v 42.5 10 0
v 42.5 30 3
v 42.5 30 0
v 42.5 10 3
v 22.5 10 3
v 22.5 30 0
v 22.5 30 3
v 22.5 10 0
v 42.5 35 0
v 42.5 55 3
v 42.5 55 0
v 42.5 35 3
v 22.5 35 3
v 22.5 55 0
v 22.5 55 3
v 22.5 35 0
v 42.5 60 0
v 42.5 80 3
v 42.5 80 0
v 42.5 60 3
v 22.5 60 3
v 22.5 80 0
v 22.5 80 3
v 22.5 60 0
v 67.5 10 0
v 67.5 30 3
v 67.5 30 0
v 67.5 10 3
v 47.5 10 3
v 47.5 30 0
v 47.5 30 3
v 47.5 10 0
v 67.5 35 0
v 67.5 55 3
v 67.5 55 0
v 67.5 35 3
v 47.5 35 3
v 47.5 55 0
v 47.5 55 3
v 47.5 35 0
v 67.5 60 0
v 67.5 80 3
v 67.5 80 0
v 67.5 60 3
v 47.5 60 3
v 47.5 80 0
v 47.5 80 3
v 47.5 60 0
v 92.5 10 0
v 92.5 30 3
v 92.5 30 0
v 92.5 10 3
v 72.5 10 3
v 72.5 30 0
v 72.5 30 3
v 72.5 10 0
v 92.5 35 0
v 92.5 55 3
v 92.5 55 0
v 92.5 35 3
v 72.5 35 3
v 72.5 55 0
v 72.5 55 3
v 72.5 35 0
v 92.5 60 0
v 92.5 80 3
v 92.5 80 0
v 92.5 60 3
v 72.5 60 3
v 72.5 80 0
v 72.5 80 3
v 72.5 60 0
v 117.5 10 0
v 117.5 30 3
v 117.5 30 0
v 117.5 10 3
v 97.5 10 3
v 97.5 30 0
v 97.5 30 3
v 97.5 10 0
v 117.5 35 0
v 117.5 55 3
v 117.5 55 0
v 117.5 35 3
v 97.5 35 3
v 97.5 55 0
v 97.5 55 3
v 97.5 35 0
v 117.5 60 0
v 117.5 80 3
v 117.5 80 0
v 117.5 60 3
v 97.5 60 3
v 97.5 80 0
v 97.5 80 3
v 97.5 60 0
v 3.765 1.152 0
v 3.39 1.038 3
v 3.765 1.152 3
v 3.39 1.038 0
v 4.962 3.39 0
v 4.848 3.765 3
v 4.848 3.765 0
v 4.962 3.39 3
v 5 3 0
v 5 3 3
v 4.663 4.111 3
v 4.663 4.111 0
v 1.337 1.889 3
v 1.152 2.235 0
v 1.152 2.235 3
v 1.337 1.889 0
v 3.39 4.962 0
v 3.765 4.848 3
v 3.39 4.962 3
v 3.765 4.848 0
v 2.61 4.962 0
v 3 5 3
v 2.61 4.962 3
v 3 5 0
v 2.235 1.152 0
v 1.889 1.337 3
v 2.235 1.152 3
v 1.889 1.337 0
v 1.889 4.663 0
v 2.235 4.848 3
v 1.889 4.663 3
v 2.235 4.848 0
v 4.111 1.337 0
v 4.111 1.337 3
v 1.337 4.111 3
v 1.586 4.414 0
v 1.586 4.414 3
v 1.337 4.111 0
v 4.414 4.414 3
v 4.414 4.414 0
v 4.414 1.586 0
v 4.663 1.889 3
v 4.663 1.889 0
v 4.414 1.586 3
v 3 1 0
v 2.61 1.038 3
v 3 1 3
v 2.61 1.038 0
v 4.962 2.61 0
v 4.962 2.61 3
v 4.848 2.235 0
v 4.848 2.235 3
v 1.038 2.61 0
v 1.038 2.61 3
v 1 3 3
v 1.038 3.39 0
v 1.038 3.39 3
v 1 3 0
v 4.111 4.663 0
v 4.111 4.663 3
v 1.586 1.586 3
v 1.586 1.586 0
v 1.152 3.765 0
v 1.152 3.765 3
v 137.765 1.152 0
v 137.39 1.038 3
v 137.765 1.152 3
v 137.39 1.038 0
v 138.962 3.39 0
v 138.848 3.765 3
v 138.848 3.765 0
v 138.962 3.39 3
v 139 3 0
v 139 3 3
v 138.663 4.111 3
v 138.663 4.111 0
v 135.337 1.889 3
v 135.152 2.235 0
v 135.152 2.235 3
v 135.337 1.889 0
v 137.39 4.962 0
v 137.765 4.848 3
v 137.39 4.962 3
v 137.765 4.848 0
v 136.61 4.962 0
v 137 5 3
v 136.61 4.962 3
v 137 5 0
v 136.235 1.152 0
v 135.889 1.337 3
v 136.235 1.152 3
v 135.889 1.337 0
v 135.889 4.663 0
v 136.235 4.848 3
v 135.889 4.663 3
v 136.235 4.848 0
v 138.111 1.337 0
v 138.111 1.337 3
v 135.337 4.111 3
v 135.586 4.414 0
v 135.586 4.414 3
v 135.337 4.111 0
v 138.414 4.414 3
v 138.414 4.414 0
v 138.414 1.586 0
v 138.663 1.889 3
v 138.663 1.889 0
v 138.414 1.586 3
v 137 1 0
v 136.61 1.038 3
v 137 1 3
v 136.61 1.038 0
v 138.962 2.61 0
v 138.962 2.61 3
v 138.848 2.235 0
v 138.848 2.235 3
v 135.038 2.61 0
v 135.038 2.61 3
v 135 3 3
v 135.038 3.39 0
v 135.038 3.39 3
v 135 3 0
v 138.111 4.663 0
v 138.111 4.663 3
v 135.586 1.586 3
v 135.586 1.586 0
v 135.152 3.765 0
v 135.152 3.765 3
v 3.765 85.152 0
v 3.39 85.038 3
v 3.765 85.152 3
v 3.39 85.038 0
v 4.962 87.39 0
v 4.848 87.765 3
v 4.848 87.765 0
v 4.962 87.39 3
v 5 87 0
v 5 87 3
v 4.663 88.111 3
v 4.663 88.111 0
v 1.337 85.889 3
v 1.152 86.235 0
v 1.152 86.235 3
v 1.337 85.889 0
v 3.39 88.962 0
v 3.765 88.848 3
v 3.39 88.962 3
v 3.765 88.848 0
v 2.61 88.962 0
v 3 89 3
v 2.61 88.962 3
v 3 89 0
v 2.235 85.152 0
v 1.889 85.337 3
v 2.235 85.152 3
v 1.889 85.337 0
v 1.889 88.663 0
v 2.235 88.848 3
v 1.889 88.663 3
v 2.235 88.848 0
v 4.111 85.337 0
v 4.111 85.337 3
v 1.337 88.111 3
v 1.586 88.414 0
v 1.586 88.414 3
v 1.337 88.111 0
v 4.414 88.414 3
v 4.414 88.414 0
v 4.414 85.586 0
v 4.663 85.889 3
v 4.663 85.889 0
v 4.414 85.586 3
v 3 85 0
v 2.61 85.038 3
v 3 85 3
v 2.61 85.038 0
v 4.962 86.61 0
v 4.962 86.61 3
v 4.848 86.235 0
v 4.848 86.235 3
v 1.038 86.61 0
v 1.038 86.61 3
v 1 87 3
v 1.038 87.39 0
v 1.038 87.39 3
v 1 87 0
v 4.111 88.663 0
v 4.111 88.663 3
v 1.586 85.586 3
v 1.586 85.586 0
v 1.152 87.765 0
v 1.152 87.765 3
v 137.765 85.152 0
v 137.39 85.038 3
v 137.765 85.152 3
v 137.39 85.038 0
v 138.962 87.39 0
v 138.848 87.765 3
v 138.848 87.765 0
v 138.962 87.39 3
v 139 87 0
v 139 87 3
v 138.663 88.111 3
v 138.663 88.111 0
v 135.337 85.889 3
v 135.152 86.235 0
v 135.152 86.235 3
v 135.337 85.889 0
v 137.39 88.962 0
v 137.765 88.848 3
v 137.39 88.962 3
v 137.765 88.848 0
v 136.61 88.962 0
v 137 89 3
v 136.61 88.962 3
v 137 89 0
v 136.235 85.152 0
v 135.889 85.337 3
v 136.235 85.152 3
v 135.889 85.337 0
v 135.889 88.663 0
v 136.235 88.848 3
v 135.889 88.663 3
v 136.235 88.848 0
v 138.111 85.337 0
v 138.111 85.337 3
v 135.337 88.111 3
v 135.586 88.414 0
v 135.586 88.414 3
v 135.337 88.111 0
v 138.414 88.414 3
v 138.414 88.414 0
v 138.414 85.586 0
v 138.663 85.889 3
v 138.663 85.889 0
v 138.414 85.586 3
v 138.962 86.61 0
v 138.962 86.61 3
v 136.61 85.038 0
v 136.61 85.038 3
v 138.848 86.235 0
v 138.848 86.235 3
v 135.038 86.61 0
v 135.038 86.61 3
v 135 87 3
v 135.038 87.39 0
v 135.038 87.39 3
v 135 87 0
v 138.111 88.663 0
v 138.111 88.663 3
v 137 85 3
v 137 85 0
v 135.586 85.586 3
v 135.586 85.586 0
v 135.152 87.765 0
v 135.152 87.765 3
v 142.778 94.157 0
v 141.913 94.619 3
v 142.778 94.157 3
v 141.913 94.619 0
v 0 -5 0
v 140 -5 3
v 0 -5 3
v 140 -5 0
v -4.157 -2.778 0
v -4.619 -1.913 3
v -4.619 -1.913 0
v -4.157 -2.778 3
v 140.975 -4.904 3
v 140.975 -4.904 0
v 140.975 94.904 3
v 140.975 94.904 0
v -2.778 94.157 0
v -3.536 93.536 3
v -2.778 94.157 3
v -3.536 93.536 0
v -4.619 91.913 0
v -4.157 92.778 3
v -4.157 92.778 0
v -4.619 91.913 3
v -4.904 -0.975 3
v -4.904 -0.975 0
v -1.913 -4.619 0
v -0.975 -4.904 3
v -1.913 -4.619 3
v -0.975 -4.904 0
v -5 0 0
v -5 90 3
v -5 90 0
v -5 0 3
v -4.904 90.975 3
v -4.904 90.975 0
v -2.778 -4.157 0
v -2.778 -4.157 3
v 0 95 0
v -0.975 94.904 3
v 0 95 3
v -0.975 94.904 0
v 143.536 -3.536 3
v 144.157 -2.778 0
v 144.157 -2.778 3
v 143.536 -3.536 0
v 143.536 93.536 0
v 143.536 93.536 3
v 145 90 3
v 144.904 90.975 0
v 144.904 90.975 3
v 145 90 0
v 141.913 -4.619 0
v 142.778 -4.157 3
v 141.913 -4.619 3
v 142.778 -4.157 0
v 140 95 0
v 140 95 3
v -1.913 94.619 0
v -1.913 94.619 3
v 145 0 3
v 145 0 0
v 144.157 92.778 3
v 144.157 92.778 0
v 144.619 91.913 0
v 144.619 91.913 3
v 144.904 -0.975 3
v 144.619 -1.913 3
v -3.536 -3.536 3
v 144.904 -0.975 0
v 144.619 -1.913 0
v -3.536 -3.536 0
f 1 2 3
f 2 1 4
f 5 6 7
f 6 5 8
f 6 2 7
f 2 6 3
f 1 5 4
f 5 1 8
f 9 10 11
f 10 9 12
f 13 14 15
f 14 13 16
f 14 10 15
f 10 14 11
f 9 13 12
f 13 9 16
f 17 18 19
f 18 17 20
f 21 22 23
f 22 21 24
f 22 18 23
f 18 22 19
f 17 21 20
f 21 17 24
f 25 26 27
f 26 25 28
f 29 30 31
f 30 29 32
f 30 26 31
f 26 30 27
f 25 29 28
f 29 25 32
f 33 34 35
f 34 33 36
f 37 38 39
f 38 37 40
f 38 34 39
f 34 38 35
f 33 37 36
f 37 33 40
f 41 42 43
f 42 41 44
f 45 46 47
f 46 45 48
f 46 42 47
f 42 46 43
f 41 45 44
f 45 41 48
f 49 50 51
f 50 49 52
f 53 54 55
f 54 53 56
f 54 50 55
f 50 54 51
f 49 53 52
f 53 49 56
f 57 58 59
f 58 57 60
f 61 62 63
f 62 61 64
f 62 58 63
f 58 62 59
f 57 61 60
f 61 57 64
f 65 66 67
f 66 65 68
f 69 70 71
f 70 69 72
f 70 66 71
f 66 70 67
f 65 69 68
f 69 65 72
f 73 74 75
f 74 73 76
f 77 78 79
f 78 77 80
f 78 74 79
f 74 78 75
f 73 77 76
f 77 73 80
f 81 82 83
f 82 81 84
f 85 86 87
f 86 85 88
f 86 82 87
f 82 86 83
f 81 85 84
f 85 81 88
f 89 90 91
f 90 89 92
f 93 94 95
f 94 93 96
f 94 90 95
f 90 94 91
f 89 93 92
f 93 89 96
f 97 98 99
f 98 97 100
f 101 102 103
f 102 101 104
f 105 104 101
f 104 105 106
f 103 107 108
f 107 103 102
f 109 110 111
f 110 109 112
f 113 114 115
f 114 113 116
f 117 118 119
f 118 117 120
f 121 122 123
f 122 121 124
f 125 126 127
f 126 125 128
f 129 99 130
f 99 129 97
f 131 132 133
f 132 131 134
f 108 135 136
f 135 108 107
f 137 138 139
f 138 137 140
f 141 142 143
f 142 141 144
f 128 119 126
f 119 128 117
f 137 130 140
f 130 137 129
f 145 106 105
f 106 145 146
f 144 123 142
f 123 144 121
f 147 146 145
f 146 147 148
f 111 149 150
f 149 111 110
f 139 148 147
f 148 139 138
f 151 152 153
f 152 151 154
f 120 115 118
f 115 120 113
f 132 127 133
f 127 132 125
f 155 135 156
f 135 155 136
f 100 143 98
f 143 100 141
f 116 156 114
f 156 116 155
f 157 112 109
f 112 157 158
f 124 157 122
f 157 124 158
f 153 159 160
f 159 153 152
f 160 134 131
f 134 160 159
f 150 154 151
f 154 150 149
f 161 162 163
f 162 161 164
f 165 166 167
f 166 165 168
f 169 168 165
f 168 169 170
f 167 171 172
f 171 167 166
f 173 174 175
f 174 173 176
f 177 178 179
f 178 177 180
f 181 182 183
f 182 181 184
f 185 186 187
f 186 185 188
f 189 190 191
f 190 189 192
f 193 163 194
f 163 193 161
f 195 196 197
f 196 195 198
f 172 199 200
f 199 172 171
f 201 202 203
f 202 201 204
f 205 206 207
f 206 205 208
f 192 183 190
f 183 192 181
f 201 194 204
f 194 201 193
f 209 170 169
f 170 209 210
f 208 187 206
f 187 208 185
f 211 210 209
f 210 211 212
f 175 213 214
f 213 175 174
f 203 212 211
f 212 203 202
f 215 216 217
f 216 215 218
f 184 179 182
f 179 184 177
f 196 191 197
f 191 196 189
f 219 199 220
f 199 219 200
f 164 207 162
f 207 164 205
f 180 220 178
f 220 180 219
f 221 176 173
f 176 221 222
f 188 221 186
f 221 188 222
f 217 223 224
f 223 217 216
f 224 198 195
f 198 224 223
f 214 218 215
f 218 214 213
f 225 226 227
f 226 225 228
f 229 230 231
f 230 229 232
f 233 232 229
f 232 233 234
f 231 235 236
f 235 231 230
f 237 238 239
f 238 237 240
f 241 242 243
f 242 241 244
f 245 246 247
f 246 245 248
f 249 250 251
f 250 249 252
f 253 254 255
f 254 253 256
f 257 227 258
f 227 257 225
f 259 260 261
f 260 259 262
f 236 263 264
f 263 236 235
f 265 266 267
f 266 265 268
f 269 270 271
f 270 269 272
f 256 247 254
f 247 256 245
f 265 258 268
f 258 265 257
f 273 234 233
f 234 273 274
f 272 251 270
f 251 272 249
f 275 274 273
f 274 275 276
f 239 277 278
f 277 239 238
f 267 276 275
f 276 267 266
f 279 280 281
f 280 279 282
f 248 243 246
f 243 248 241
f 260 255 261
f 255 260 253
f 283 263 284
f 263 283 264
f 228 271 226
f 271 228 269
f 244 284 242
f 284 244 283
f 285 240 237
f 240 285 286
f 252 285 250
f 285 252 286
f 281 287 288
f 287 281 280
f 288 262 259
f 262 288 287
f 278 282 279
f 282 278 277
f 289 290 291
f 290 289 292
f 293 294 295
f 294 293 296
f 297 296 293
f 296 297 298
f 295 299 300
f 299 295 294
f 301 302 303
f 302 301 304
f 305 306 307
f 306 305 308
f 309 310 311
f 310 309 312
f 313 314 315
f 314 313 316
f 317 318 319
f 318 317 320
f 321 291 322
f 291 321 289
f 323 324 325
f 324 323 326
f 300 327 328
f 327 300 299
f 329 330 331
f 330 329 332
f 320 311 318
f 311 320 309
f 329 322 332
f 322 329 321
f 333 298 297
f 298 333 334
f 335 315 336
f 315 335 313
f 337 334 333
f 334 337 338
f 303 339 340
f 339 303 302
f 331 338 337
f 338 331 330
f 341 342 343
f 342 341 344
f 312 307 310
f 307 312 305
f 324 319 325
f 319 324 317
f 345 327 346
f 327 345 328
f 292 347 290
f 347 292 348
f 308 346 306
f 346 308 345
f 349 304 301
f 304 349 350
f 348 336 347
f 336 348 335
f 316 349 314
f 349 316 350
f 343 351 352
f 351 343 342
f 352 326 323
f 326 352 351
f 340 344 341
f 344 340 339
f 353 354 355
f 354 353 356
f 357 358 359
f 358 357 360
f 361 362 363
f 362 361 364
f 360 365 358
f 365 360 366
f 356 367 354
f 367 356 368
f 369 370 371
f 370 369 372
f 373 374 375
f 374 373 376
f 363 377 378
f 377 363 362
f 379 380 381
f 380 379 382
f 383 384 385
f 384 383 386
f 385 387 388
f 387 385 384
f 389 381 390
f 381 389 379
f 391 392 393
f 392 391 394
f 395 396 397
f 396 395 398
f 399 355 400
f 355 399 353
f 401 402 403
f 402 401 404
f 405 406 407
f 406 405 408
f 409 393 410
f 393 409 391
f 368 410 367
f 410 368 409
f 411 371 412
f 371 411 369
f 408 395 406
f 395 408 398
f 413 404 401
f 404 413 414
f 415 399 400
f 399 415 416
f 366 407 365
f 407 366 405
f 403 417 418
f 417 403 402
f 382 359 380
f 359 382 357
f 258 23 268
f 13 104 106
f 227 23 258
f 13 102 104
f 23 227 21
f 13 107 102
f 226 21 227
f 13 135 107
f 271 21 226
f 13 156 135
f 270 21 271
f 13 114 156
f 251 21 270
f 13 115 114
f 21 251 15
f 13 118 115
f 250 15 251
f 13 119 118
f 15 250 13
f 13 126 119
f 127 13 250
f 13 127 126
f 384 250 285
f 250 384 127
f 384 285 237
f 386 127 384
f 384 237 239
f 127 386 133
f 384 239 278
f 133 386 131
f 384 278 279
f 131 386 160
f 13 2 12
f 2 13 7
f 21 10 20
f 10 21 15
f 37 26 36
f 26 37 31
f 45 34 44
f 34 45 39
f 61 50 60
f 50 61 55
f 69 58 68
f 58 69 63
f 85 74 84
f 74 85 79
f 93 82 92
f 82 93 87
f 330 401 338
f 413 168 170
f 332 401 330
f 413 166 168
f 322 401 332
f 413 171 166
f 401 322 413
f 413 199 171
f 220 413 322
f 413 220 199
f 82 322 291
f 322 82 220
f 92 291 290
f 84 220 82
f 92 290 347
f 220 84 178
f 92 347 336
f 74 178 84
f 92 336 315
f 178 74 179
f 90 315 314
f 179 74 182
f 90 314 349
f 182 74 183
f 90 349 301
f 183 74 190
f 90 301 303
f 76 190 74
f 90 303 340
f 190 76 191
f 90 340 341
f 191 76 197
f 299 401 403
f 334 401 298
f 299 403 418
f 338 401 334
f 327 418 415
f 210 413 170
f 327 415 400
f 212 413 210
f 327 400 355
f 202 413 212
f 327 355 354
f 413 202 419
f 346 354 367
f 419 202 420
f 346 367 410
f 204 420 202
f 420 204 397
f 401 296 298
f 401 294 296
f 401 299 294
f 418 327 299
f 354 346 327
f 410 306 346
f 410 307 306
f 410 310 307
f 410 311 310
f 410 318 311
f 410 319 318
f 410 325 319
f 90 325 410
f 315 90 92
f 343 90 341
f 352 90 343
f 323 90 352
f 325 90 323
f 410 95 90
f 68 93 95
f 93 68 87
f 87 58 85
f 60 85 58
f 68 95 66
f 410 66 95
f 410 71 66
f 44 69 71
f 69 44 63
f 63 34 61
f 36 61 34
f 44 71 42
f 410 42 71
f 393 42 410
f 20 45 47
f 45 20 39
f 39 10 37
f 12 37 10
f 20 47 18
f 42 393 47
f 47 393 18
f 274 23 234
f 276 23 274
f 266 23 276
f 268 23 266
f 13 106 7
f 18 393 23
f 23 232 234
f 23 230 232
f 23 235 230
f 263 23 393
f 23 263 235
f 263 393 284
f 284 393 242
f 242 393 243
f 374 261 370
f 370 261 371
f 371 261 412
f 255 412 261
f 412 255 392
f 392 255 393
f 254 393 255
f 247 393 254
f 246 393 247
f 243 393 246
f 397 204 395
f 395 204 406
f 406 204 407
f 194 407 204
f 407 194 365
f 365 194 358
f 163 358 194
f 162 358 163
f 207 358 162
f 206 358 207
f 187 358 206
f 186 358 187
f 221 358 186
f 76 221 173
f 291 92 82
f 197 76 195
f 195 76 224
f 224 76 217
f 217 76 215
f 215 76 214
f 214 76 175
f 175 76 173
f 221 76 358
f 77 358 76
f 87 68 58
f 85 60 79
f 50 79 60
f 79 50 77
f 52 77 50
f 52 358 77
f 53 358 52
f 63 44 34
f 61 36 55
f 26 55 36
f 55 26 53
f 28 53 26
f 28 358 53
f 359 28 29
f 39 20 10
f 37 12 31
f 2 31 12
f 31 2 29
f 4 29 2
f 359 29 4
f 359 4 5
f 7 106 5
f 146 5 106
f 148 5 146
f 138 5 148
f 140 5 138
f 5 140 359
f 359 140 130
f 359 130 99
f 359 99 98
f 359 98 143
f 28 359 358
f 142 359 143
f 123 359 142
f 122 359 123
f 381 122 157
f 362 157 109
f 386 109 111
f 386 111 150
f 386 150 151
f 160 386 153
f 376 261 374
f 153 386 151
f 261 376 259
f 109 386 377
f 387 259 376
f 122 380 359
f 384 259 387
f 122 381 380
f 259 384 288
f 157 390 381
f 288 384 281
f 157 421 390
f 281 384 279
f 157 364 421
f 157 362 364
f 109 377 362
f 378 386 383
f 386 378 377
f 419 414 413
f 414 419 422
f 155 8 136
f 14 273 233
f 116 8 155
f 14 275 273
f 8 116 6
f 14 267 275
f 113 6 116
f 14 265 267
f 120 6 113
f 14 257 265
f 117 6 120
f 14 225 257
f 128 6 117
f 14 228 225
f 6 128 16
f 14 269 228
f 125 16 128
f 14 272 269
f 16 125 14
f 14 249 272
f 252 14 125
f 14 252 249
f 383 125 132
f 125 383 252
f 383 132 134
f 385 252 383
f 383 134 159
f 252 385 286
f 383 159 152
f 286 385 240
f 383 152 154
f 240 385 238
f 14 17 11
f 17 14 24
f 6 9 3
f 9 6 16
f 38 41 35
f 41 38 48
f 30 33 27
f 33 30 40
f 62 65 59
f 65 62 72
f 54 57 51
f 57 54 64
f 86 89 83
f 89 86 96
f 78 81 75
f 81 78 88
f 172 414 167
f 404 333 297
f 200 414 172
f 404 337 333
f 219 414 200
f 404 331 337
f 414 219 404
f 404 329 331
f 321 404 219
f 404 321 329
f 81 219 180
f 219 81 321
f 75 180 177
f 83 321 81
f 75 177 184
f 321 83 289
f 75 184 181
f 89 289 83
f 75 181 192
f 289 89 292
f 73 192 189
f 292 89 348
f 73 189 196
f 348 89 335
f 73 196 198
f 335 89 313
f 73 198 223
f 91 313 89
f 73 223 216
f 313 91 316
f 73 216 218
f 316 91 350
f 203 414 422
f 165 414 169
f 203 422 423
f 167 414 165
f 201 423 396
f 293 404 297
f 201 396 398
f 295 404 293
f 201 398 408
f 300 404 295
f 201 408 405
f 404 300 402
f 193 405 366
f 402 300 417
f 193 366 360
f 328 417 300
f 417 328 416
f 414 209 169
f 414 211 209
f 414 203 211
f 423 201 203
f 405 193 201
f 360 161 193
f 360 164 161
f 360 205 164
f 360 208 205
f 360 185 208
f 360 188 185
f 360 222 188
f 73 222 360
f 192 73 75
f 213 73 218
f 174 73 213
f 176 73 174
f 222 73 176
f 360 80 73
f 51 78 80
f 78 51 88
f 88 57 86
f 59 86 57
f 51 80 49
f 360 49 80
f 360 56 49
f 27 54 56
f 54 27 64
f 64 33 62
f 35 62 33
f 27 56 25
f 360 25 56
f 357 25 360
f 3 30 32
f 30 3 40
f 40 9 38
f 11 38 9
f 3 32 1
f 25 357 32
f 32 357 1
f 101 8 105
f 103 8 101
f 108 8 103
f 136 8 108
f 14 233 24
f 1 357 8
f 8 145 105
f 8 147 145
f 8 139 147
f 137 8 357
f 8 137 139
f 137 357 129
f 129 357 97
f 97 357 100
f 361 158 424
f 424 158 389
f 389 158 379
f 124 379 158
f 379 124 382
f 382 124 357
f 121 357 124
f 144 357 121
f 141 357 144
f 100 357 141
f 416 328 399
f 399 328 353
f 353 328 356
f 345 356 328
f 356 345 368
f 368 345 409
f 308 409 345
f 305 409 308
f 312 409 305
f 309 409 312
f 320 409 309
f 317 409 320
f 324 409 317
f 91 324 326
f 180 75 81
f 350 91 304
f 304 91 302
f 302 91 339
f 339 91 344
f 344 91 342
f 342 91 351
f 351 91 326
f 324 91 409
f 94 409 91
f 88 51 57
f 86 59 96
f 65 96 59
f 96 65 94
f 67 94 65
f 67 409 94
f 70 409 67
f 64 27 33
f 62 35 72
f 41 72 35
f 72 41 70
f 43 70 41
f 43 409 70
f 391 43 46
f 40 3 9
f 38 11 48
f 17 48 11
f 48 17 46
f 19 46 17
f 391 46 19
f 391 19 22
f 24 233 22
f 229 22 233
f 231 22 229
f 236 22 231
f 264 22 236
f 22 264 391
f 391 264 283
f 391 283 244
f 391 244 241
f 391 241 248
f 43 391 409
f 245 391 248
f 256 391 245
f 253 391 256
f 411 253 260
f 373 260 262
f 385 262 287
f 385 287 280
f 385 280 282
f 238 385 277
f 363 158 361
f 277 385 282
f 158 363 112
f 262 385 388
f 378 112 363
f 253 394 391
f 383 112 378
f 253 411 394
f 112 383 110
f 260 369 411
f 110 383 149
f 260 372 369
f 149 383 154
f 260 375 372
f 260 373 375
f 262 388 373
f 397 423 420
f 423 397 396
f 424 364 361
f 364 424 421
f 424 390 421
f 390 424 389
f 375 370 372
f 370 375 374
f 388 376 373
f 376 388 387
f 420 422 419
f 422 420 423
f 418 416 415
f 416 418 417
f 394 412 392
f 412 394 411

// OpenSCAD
// Volkswitch Keyguard Demo
// A simplified example demonstrating multi-file project support
// For full keyguard functionality, visit: https://volksswitch.org
// Version: demo

/* [Keyguard Settings] */
// Width of the keyguard in millimeters
width = 150; // [50:1:300]

// Height of the keyguard in millimeters  
height = 100; // [30:1:200]

// Thickness of the keyguard material
thickness = 3; // [1:0.5:10]

// Corner radius for rounded edges
corner_radius = 5; // [0:1:20]

/* [Grid Layout] */
// Number of button columns
columns = 4; // [1:1:10]

// Number of button rows
rows = 3; // [1:1:8]

// Space between buttons (gap)
button_gap = 5; // [2:1:20]

// Button opening size (square)
button_size = 20; // [10:1:50]

/* [Mounting Options] */
// Add mounting holes in corners
add_mounting_holes = true; // [true, false]

// Mounting hole diameter
mounting_hole_diameter = 4; // [2:0.5:10]

// Distance from edge to mounting hole center
mounting_hole_inset = 8; // [5:1:20]

/* [Advanced] */
// Type of keyguard
type_of_keyguard = "3D-Printed"; // ["3D-Printed", "Laser-Cut"]

// File for custom openings (optional)
openings_file = "openings_and_additions.txt";

/* [Hidden] */
$fn = 32;

// Main module
module keyguard() {
    difference() {
        // Base plate with rounded corners
        minkowski() {
            cube([width - corner_radius*2, height - corner_radius*2, thickness/2]);
            cylinder(r=corner_radius, h=thickness/2);
        }
        
        // Button grid openings
        grid_width = columns * (button_size + button_gap) - button_gap;
        grid_height = rows * (button_size + button_gap) - button_gap;
        grid_x = (width - grid_width) / 2;
        grid_y = (height - grid_height) / 2;
        
        for (col = [0:columns-1]) {
            for (row = [0:rows-1]) {
                x = grid_x + col * (button_size + button_gap);
                y = grid_y + row * (button_size + button_gap);
                translate([x - corner_radius, y - corner_radius, -1])
                    cube([button_size, button_size, thickness + 2]);
            }
        }
        
        // Mounting holes (if enabled)
        if (add_mounting_holes) {
            hole_positions = [
                [mounting_hole_inset - corner_radius, mounting_hole_inset - corner_radius],
                [width - mounting_hole_inset - corner_radius, mounting_hole_inset - corner_radius],
                [mounting_hole_inset - corner_radius, height - mounting_hole_inset - corner_radius],
                [width - mounting_hole_inset - corner_radius, height - mounting_hole_inset - corner_radius]
            ];
            
            for (pos = hole_positions) {
                translate([pos[0], pos[1], -1])
                    cylinder(d=mounting_hole_diameter, h=thickness + 2);
            }
        }
    }
}

// Render the keyguard
keyguard();

// Info text (for preview)
echo(str("Keyguard: ", width, "mm x ", height, "mm x ", thickness, "mm"));
echo(str("Grid: ", columns, " columns x ", rows, " rows"));
echo(str("Type: ", type_of_keyguard));
